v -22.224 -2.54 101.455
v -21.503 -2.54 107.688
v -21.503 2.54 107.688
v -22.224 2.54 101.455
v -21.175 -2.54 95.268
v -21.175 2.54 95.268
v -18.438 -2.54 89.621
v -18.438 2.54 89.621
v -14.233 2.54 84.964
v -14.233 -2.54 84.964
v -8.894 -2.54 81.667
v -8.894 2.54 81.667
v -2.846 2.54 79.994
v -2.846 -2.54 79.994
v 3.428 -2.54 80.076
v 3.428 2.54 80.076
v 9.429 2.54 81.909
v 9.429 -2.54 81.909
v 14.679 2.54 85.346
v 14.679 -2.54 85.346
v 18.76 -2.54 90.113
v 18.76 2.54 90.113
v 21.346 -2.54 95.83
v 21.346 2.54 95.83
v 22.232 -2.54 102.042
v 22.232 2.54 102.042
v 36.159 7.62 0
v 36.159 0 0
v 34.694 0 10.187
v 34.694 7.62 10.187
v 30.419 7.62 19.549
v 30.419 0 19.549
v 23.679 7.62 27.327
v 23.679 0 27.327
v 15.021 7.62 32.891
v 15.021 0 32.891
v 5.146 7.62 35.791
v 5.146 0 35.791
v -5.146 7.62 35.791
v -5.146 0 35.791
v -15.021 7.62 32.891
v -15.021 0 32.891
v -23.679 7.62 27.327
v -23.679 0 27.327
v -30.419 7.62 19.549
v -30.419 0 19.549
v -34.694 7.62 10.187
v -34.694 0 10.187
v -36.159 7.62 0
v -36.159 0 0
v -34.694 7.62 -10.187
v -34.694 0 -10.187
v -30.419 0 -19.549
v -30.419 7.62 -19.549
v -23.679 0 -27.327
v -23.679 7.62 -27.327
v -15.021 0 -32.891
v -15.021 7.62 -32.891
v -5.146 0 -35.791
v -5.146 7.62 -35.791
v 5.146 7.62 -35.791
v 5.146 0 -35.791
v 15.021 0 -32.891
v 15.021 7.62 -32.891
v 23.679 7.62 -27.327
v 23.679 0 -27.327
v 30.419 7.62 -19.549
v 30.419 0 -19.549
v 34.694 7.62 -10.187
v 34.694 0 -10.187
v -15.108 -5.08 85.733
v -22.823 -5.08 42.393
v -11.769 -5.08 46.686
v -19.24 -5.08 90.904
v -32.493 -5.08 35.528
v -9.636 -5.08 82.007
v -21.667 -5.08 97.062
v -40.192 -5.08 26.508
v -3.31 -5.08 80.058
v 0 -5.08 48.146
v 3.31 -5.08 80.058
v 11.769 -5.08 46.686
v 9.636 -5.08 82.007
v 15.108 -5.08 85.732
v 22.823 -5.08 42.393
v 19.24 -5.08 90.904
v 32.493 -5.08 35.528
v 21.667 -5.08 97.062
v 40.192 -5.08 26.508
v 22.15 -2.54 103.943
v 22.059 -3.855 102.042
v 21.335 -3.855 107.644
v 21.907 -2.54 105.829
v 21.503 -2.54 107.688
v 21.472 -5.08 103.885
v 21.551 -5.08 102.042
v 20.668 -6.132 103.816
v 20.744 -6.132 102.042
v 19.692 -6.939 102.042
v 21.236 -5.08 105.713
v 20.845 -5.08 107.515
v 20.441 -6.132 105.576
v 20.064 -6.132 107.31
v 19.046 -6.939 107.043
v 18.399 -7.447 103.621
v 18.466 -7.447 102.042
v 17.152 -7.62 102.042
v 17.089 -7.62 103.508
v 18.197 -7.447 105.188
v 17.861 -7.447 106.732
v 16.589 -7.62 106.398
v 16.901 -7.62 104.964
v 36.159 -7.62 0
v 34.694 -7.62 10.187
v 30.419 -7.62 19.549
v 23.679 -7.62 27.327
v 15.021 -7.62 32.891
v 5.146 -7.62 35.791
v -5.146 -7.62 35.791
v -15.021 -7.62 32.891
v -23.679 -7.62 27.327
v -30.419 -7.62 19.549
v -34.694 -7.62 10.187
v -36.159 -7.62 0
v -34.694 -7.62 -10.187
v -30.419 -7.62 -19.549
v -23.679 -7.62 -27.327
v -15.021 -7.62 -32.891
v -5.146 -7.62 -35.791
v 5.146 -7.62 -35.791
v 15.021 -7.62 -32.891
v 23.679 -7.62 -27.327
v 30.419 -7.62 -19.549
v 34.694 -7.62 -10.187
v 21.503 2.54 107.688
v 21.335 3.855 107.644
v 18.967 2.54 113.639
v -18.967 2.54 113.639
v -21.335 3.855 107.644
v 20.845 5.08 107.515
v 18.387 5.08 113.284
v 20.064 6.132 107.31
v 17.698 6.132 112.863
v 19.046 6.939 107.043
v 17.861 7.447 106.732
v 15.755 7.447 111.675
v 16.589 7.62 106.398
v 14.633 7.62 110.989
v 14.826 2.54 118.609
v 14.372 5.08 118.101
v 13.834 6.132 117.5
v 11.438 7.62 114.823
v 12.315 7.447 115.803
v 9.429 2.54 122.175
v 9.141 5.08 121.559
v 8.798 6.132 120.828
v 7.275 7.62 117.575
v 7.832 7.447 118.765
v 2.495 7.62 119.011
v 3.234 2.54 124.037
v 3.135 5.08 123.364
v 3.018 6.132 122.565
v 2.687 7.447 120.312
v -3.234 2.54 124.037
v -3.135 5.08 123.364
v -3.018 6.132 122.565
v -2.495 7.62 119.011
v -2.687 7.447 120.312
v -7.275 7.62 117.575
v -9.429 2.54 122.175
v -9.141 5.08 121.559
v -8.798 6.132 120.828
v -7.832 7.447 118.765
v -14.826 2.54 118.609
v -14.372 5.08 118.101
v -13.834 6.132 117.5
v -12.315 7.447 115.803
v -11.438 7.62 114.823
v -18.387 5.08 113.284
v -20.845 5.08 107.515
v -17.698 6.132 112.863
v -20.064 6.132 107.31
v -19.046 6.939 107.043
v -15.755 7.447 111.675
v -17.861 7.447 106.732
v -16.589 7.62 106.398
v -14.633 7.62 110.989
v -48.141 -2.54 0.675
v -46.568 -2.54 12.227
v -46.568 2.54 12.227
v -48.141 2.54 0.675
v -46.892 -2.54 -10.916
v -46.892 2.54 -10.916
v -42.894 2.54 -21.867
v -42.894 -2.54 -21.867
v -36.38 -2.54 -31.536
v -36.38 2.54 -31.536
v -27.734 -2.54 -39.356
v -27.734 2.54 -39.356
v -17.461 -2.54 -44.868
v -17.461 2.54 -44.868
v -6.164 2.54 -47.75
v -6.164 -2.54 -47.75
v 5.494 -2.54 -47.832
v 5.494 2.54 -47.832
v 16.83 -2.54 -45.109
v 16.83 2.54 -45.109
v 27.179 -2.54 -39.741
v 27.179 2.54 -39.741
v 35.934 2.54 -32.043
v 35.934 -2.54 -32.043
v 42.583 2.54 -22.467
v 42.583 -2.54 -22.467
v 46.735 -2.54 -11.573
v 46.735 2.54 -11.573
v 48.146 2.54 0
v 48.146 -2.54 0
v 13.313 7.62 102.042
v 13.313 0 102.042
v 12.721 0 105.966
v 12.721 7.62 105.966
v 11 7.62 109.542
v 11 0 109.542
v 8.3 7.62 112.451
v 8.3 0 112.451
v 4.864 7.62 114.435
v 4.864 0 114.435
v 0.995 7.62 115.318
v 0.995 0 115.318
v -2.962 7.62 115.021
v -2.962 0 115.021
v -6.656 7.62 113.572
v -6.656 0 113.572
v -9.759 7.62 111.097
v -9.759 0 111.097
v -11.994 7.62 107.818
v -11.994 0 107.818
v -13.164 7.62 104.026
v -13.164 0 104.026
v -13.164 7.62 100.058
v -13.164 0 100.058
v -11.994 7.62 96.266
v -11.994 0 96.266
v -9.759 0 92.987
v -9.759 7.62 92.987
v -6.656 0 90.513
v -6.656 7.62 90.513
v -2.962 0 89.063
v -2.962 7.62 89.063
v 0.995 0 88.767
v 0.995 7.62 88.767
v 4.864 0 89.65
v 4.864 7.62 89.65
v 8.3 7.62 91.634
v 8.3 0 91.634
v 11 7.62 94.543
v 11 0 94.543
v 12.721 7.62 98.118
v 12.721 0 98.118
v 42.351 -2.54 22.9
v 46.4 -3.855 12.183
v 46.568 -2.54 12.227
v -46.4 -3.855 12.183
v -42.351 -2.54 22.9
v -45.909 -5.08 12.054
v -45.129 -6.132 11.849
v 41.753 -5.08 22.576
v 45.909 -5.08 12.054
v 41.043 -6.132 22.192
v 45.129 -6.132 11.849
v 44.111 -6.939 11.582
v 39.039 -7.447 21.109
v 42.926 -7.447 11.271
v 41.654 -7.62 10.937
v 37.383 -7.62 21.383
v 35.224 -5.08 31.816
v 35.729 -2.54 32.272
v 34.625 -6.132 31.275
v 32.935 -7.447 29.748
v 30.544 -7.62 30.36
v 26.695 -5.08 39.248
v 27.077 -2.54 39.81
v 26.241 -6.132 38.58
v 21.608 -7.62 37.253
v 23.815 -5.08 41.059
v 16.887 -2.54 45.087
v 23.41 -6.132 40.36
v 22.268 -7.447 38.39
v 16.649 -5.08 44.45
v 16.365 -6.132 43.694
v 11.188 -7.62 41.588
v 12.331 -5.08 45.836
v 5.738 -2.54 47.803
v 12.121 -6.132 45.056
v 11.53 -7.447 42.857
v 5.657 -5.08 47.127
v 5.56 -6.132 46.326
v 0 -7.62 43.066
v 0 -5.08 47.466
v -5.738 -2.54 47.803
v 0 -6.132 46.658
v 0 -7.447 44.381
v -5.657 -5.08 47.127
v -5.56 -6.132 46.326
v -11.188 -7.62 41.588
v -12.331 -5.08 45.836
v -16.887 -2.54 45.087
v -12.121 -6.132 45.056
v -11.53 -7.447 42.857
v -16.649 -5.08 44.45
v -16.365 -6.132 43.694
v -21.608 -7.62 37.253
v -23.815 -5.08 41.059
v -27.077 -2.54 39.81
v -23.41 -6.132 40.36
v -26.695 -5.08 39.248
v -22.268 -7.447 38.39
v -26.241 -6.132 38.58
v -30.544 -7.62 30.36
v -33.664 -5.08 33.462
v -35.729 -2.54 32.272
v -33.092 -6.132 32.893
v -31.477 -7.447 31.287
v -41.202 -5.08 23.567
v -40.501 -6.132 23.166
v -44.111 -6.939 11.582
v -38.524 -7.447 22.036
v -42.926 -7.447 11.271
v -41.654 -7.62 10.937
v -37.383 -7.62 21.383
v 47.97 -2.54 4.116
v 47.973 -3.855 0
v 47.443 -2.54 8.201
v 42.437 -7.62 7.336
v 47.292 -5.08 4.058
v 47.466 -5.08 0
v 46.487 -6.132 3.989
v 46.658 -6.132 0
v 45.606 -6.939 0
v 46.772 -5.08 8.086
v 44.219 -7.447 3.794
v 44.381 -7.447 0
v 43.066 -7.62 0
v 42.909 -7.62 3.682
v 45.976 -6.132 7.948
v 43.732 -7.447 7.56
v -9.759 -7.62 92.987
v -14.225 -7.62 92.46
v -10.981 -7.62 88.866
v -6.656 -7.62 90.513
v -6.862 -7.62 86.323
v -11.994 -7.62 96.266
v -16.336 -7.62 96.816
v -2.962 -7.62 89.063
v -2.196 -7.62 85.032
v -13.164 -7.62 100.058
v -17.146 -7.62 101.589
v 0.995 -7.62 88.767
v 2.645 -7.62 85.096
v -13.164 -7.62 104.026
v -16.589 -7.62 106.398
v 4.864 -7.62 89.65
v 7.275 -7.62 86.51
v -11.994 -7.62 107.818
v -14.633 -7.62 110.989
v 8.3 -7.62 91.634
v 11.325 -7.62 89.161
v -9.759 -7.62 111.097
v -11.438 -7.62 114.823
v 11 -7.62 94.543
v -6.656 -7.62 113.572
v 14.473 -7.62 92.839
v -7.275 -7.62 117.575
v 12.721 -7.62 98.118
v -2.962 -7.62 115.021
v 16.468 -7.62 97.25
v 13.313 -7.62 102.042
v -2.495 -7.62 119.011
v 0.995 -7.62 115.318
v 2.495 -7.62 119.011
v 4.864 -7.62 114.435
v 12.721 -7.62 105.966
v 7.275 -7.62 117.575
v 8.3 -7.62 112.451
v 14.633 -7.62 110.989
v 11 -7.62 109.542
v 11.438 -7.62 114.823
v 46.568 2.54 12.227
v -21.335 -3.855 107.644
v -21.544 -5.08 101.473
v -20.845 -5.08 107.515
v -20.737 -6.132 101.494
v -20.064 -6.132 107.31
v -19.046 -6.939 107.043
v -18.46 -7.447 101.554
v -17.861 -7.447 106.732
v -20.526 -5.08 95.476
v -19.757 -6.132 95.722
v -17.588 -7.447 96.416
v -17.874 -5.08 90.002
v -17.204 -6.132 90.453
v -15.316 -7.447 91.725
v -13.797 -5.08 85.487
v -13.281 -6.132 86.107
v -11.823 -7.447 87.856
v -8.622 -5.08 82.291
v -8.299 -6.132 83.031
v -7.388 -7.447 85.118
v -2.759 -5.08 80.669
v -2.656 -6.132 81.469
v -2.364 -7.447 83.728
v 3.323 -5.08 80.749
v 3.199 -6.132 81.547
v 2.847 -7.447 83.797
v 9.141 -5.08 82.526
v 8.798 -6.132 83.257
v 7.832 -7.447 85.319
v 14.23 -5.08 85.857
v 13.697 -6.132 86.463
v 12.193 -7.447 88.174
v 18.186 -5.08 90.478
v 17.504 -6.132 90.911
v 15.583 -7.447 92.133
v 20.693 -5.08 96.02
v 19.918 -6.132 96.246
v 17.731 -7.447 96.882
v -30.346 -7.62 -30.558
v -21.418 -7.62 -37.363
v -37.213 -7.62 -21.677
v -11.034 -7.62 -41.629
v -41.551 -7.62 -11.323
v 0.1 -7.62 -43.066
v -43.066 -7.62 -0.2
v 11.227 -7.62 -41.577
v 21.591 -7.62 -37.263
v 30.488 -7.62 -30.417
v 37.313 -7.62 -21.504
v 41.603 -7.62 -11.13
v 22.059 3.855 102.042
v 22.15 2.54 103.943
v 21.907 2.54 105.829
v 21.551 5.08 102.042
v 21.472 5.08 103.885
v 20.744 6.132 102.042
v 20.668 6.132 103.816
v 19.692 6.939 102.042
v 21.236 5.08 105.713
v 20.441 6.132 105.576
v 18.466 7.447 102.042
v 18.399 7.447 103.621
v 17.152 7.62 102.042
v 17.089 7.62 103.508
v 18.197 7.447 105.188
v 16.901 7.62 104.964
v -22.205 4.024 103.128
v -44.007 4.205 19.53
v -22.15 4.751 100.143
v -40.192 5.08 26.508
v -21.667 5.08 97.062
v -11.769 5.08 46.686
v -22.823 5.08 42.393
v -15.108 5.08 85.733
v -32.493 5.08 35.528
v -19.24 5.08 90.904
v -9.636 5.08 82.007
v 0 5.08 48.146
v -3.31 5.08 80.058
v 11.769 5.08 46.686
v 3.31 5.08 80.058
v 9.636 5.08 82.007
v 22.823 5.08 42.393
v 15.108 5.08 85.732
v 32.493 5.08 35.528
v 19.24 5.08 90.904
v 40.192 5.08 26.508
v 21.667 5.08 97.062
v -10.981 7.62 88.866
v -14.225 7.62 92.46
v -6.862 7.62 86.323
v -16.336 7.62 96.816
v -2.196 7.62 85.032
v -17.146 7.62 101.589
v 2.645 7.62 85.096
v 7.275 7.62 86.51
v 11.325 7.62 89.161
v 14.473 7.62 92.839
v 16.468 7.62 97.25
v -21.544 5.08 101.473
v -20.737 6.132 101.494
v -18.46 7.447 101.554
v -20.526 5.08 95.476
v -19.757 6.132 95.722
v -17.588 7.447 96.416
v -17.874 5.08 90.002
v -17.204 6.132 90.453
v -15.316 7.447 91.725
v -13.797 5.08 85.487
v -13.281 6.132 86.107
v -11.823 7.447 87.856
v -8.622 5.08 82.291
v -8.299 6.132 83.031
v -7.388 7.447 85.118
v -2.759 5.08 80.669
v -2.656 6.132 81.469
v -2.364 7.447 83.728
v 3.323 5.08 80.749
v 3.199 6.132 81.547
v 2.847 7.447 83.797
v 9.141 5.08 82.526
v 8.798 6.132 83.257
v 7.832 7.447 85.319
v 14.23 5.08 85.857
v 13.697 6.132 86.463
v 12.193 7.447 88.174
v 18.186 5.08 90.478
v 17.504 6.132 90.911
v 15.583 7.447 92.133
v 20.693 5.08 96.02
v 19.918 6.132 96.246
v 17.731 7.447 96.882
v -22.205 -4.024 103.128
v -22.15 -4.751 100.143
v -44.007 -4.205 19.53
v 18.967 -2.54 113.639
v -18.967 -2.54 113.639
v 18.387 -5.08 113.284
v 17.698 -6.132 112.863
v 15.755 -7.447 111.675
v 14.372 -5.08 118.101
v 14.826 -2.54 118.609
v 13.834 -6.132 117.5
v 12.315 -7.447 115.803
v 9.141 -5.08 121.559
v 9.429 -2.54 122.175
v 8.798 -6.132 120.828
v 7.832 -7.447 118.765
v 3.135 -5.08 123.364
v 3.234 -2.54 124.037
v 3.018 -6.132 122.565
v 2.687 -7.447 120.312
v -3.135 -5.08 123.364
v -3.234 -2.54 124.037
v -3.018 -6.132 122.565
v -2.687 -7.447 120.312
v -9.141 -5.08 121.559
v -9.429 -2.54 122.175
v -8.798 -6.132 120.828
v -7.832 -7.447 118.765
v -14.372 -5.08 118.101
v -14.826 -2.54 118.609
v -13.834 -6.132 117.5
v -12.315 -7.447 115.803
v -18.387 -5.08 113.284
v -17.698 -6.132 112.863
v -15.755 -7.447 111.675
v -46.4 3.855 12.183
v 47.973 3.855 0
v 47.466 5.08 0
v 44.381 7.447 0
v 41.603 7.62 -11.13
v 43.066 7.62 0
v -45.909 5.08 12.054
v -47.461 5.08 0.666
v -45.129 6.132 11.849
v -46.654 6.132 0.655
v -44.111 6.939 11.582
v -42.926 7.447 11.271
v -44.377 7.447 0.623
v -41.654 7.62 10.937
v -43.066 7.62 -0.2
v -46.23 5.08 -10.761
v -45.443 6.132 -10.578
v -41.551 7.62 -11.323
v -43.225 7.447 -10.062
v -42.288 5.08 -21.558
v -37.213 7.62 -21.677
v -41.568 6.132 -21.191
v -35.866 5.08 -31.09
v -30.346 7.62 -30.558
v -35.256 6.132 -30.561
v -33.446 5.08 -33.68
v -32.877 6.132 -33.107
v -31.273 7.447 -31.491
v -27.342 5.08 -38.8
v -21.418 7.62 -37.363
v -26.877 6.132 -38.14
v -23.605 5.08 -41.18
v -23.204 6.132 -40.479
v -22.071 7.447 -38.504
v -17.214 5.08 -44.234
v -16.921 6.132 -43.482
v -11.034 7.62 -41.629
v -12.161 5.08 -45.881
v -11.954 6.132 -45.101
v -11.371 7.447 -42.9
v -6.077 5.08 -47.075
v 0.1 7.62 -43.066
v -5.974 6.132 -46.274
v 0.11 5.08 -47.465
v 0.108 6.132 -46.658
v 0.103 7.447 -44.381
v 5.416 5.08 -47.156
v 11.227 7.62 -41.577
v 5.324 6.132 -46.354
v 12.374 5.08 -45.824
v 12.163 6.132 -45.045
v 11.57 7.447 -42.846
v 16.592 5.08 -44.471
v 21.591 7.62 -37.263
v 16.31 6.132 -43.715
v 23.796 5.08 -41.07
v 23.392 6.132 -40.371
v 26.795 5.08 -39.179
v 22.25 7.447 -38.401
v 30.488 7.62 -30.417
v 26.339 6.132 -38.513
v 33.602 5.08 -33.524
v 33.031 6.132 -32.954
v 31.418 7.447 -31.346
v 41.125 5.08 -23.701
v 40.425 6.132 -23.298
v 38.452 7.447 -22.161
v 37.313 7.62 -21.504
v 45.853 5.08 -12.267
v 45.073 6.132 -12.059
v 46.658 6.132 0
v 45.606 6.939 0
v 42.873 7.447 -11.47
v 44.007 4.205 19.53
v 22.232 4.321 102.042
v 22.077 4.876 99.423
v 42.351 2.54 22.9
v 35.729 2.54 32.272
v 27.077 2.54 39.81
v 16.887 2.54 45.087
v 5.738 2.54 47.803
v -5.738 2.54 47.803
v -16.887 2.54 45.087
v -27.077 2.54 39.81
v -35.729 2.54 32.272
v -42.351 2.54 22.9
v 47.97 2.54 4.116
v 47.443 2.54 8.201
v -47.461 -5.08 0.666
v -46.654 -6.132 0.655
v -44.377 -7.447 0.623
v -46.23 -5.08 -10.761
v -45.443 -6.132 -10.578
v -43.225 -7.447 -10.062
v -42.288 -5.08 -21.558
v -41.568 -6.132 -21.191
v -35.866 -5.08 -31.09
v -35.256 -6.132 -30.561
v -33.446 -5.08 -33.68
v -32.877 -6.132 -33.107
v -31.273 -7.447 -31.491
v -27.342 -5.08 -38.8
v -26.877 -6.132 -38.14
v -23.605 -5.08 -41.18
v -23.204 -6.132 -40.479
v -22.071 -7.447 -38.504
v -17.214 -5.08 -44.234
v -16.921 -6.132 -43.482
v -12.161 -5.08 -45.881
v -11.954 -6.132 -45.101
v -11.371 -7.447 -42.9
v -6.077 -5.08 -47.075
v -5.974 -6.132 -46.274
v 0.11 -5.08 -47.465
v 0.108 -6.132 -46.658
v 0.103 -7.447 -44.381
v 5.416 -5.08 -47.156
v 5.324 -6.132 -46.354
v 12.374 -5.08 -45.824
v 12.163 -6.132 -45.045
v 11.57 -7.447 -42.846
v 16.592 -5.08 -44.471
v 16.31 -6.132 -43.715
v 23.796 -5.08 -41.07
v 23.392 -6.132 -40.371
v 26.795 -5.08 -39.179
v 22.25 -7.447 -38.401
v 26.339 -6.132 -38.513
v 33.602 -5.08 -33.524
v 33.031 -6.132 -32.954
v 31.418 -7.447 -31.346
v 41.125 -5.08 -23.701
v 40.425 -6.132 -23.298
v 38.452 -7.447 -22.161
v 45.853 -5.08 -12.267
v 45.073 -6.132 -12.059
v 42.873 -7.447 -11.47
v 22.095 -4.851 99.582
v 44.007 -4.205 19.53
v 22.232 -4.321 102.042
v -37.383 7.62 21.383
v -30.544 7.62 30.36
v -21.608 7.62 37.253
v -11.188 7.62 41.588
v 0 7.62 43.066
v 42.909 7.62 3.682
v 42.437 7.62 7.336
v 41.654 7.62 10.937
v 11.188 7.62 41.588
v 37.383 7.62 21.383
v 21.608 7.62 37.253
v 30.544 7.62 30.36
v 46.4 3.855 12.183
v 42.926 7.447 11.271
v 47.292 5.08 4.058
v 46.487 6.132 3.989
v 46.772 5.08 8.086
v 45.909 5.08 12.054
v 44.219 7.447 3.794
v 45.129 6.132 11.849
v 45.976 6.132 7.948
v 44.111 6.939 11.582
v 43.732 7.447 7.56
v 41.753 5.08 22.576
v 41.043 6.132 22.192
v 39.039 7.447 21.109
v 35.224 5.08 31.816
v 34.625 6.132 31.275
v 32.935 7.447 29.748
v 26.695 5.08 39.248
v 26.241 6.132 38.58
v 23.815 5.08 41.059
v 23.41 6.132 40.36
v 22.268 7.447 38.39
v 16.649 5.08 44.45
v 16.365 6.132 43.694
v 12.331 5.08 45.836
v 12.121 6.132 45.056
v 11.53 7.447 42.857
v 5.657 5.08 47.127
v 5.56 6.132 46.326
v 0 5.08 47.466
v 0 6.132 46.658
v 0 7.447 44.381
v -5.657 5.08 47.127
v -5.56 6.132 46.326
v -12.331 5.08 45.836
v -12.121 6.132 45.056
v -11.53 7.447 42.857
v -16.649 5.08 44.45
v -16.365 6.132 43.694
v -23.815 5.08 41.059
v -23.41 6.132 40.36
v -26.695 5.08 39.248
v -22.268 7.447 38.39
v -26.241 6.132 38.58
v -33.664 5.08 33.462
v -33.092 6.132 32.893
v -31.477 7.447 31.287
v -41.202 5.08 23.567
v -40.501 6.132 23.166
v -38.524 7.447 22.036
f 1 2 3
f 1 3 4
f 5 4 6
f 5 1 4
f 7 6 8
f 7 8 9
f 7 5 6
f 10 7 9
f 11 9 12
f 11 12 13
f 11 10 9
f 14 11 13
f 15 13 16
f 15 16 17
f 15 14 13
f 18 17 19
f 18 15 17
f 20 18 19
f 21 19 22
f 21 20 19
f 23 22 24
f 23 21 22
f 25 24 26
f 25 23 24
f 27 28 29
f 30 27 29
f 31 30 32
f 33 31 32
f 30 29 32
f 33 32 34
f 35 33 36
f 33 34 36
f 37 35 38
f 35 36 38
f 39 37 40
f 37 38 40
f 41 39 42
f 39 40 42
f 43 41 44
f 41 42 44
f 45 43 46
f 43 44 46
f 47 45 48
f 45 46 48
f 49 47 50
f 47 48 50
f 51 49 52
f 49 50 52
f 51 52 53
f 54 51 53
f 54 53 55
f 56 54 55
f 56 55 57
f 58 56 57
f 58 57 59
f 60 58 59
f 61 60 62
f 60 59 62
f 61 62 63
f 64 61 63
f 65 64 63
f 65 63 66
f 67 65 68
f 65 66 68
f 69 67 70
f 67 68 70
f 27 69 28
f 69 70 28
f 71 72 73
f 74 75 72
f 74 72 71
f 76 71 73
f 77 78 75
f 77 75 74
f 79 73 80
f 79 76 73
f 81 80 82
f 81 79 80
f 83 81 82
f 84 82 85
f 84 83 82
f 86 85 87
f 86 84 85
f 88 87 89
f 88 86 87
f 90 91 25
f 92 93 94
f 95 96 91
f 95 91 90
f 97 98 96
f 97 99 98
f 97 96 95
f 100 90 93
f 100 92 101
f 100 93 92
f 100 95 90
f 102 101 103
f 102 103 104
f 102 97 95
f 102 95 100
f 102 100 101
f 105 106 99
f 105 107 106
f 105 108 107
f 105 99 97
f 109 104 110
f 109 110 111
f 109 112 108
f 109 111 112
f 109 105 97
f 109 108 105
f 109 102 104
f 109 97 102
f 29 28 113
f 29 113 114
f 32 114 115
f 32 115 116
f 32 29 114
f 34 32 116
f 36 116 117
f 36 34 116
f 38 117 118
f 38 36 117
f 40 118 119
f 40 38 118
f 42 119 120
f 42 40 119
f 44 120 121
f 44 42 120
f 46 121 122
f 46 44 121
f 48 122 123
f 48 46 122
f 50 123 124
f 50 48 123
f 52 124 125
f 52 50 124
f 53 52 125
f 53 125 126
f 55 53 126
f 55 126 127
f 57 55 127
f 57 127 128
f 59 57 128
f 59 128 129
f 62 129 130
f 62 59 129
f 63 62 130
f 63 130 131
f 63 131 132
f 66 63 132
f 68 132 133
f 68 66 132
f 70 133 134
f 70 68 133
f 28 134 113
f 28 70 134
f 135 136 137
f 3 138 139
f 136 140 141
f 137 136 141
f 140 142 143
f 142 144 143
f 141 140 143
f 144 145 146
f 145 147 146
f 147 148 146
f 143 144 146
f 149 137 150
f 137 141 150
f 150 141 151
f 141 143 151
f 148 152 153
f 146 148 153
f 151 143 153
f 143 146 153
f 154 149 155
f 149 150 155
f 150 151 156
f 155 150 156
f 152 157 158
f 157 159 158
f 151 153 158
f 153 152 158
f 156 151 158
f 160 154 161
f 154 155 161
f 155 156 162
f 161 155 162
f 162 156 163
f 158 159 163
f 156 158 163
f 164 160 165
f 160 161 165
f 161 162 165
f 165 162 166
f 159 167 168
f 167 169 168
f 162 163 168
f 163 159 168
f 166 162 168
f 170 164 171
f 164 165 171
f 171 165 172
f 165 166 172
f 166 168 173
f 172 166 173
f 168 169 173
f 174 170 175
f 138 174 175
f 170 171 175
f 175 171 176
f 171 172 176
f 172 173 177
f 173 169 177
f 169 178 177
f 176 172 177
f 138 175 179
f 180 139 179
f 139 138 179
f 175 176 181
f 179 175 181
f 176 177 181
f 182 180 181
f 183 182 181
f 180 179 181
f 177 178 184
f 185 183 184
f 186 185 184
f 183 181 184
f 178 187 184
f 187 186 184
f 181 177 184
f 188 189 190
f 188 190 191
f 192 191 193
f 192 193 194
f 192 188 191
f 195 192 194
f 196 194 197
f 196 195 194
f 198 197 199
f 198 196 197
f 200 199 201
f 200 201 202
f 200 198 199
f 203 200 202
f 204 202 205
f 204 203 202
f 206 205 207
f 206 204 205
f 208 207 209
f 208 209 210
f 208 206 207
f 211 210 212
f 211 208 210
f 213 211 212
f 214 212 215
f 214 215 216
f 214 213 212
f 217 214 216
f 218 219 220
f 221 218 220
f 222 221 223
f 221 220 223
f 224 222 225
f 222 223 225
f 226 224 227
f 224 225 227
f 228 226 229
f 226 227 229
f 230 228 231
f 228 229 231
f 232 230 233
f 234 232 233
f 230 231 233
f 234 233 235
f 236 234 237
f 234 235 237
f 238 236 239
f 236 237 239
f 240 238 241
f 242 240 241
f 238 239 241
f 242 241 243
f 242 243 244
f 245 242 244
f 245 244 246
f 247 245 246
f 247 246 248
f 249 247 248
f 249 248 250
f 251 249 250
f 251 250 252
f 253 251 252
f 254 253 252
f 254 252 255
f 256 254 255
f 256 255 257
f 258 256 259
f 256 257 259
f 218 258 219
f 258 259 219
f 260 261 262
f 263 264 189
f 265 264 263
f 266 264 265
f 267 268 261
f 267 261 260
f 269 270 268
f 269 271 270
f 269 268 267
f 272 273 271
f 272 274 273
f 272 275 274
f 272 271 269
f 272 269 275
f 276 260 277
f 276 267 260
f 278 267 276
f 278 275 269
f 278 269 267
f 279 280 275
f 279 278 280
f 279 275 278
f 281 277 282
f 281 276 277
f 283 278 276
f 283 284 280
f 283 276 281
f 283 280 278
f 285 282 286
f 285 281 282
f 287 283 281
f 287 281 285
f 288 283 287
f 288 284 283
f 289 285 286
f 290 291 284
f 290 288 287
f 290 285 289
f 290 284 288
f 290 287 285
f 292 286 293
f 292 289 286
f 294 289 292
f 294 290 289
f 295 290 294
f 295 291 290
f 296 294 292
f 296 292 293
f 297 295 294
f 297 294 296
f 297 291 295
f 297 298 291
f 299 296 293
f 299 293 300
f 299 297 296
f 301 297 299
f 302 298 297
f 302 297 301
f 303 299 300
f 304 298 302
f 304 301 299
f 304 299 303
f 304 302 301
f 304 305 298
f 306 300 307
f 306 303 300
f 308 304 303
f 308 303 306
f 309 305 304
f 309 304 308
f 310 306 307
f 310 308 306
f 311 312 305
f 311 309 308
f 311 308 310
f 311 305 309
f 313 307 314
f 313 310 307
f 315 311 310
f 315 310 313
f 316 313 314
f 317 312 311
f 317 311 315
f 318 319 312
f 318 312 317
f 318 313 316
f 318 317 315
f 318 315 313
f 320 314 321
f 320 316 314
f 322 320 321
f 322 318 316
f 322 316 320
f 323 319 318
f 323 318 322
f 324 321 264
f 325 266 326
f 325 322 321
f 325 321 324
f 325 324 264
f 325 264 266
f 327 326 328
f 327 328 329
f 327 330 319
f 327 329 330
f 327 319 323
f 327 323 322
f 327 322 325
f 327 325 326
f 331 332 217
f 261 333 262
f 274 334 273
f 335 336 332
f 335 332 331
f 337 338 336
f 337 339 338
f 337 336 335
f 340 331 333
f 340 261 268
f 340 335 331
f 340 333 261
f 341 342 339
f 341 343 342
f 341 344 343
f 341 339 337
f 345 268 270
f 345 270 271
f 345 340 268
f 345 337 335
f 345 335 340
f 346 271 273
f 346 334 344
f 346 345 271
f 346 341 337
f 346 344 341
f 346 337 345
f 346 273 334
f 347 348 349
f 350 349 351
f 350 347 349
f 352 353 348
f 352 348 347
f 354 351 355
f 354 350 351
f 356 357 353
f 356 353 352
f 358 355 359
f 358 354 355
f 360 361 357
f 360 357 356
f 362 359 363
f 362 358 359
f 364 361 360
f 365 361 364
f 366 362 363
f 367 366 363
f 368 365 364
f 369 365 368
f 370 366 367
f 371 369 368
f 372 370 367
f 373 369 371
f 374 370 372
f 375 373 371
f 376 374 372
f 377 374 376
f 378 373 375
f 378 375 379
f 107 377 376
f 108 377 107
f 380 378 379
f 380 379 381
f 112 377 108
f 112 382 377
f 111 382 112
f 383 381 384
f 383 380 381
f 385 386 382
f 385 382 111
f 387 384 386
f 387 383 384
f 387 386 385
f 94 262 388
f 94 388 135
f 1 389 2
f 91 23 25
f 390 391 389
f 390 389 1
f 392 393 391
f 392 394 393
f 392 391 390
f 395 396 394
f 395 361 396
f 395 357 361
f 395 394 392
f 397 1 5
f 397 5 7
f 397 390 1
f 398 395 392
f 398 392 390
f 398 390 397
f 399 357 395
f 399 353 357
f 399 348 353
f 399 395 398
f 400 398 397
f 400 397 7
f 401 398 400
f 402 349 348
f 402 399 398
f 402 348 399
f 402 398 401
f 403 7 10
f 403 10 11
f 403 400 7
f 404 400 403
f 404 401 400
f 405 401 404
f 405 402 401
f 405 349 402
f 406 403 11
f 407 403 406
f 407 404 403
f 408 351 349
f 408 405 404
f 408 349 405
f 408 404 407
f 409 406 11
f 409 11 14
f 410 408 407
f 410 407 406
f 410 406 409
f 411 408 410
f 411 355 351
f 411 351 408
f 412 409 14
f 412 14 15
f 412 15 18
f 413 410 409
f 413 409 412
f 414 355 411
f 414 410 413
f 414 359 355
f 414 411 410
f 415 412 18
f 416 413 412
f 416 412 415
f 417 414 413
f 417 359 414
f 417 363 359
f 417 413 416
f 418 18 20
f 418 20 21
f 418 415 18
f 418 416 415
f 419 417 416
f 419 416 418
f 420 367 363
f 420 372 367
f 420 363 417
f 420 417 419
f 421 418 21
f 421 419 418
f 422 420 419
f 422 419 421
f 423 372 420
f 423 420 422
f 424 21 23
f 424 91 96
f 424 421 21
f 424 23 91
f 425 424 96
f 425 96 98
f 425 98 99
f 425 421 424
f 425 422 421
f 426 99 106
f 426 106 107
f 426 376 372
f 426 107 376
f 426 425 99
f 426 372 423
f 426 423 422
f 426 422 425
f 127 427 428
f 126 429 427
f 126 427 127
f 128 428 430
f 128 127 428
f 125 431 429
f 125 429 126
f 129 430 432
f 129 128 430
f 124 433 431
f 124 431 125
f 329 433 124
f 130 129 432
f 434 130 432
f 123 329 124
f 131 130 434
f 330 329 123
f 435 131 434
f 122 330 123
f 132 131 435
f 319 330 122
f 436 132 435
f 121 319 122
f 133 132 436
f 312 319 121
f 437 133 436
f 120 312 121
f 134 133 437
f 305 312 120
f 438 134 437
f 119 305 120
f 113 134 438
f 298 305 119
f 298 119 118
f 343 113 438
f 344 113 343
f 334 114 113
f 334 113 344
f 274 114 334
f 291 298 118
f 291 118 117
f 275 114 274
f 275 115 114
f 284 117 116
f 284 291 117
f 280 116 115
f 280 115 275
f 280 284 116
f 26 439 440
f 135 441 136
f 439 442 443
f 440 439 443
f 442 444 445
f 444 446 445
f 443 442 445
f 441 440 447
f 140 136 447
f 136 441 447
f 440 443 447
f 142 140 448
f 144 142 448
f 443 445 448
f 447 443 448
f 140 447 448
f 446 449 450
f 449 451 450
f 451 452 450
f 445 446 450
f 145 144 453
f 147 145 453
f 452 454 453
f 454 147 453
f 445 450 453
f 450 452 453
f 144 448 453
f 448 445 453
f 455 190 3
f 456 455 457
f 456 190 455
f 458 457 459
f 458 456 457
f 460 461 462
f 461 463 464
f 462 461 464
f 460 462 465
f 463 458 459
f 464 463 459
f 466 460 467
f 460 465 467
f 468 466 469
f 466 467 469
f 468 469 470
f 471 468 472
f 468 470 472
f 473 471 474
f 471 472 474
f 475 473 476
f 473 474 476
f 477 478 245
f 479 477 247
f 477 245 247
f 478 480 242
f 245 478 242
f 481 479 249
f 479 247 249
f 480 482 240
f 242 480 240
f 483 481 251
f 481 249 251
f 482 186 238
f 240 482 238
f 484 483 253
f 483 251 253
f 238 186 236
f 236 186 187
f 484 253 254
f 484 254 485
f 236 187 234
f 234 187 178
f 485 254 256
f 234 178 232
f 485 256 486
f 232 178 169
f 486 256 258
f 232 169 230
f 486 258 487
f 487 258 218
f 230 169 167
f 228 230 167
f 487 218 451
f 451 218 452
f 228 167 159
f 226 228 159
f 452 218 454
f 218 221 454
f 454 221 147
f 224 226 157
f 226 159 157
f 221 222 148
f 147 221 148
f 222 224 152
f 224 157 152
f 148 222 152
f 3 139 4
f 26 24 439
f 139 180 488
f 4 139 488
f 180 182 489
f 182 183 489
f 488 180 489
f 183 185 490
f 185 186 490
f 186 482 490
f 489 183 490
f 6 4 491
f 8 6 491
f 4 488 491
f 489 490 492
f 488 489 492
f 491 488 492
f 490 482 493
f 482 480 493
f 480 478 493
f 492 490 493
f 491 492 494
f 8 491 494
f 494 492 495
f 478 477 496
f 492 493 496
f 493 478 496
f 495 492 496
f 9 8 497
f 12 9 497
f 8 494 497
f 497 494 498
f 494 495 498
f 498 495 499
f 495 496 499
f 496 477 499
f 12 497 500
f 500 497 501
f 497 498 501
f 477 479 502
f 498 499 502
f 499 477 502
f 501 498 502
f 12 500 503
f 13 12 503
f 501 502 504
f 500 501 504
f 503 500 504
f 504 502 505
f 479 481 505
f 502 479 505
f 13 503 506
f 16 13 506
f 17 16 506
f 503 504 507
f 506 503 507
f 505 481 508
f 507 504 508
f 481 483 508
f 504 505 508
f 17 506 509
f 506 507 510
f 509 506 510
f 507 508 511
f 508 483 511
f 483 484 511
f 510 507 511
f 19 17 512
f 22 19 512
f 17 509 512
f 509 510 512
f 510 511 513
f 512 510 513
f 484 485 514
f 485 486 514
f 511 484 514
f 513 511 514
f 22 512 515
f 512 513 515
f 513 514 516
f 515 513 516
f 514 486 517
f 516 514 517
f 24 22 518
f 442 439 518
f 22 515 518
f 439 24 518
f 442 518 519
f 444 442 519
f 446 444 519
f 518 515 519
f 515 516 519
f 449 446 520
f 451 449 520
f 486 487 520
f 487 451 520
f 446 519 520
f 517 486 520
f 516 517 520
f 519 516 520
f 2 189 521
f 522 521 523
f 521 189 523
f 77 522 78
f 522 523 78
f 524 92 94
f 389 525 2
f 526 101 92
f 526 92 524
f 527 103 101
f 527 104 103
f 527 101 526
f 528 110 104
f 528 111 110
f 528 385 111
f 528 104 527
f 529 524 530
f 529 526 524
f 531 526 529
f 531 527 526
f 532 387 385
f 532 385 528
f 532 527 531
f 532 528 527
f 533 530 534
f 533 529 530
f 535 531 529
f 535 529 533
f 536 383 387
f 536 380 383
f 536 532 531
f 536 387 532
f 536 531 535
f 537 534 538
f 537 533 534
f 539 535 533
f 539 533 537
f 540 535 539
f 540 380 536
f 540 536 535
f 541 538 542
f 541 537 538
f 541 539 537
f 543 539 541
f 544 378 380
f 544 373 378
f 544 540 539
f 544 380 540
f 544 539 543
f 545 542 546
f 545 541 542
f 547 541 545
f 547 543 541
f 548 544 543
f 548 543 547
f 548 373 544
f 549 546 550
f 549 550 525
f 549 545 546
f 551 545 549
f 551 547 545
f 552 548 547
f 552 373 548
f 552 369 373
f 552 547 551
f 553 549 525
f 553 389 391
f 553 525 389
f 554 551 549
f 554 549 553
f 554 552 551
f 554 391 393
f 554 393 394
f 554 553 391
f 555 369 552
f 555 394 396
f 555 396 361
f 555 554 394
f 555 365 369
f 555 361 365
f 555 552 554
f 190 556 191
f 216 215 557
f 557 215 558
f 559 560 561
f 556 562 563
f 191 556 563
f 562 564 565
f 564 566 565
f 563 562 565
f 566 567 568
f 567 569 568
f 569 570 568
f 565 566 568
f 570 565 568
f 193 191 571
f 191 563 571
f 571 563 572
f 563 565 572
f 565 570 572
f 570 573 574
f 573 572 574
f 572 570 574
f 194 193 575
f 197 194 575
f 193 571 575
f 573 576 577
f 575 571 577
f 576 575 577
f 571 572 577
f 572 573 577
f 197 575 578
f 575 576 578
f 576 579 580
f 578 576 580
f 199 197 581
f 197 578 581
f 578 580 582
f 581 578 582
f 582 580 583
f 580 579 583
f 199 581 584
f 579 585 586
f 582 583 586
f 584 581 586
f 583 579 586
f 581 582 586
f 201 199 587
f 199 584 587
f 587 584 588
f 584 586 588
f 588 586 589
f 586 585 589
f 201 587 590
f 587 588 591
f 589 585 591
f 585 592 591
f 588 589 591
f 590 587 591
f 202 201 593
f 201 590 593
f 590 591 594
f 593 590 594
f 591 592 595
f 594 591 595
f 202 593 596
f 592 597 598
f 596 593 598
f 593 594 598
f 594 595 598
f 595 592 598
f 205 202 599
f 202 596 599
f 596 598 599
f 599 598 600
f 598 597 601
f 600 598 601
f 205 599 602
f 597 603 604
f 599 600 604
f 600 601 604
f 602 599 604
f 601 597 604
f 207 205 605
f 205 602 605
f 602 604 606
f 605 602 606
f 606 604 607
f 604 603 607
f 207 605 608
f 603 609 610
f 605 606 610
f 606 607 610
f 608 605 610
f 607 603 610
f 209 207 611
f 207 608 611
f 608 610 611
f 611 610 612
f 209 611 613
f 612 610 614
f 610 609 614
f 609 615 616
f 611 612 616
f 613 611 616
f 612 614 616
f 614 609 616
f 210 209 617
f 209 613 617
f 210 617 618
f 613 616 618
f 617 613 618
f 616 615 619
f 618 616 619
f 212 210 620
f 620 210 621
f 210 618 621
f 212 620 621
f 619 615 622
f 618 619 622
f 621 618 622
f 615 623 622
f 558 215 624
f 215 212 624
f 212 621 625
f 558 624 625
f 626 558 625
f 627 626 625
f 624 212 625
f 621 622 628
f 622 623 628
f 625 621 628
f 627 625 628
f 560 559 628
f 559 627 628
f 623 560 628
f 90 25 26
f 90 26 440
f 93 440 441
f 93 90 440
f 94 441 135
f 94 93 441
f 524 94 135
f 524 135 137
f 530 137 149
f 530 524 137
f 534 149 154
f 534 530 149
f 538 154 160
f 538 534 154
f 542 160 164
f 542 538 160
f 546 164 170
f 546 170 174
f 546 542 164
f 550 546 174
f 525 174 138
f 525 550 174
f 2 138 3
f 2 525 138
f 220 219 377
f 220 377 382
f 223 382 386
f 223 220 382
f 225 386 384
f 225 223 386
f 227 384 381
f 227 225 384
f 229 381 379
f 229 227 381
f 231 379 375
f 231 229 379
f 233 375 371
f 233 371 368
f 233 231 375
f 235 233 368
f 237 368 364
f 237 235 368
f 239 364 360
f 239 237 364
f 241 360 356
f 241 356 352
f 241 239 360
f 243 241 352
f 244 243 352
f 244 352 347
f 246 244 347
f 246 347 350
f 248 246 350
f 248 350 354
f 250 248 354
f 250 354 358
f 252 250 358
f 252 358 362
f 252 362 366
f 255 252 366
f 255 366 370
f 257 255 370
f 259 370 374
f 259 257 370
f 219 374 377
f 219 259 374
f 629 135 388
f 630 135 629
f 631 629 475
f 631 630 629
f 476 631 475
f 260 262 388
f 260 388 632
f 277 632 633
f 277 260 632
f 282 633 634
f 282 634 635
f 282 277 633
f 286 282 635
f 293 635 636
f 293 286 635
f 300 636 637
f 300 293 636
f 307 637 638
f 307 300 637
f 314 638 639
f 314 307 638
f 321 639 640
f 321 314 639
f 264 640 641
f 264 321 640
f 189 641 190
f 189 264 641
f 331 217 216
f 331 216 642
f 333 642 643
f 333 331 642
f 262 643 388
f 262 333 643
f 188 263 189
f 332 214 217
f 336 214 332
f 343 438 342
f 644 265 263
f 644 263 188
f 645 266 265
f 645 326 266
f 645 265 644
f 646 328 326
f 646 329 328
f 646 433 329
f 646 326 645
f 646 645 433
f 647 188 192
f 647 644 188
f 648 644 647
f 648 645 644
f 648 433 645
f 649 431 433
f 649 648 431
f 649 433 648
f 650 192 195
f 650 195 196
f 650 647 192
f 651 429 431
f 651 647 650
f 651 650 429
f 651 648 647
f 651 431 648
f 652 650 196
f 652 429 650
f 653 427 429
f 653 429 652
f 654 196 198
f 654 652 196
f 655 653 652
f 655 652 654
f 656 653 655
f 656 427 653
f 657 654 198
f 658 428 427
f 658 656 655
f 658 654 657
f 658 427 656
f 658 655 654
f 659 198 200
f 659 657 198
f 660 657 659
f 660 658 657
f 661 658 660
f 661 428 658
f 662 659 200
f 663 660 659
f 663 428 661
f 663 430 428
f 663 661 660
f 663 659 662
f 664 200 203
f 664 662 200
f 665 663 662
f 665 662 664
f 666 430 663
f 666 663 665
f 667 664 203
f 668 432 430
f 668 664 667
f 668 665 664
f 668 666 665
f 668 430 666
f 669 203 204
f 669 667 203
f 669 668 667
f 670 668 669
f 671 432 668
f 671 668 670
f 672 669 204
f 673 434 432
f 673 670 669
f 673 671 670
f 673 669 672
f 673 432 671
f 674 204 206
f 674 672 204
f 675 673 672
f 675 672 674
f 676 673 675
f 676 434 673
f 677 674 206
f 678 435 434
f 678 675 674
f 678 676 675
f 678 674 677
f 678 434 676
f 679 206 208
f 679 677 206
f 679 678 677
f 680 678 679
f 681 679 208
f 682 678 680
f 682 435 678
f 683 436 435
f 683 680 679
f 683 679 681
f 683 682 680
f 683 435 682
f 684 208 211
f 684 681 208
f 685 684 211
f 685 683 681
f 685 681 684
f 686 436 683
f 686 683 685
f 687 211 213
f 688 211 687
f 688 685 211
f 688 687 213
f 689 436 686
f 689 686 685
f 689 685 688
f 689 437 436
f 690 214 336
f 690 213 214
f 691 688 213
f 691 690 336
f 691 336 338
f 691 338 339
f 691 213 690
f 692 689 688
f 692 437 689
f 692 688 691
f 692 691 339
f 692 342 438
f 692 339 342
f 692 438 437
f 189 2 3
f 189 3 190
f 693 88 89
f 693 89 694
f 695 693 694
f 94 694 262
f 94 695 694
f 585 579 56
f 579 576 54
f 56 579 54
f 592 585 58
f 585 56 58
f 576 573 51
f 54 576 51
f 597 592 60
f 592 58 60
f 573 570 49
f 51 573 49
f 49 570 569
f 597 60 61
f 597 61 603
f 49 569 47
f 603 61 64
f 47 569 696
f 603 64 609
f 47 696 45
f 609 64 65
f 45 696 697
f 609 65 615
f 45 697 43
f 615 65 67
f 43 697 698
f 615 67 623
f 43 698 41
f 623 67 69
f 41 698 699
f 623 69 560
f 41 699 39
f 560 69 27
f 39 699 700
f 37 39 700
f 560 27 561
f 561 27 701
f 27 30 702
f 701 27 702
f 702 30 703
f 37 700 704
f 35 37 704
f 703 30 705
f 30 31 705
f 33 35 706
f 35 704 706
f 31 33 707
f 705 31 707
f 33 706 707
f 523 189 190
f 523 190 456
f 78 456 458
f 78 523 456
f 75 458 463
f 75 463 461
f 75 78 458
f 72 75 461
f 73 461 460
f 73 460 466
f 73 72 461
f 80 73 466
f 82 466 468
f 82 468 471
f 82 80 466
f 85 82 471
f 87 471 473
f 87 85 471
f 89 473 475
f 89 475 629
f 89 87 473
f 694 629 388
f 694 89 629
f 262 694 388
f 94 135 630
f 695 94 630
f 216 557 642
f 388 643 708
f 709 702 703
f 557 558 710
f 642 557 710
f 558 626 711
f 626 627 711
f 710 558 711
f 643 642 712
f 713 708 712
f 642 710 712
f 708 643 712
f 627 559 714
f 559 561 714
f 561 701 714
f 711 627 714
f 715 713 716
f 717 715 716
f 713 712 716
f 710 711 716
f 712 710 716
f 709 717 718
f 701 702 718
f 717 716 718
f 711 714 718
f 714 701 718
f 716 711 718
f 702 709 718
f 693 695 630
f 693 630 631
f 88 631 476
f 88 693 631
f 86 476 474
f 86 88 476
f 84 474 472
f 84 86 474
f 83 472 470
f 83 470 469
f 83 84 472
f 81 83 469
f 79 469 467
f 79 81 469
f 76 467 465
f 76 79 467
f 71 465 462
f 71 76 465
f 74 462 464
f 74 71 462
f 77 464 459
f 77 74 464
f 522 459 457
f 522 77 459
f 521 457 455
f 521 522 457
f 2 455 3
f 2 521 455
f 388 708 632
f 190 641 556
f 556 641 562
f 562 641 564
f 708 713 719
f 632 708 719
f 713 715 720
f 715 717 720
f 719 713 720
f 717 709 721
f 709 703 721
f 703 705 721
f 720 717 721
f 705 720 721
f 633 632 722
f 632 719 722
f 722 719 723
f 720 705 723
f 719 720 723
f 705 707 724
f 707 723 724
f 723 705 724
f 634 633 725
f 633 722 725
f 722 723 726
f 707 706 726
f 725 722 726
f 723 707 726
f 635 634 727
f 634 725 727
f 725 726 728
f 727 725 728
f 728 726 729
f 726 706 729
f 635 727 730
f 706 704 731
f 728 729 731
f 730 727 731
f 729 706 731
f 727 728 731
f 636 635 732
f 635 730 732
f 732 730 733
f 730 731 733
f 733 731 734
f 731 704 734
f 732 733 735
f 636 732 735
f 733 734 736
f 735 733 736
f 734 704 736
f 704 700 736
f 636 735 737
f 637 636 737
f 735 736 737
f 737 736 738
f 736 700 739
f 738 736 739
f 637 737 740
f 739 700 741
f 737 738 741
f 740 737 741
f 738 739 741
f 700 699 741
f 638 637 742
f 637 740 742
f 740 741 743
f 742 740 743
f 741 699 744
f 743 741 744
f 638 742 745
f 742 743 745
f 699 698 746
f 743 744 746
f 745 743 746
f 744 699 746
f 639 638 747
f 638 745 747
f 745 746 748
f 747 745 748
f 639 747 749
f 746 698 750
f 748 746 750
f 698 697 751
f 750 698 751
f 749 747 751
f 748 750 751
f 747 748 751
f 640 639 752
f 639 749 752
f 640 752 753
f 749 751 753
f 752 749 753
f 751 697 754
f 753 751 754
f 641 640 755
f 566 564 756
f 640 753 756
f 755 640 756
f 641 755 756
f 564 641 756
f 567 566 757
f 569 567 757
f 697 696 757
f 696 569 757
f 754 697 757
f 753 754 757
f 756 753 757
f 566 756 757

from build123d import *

# Parameters (mm, degrees)
F0_R          = 36.158901
F0_R_2        = 13.312834
F1_DEPTH      = 7.62
F1_DEPTH_BACK = 7.62
F2_DEPTH      = 5.08
F2_DEPTH_BACK = 5.08
F3_R          = 5.08
F4_R          = 2.54


with BuildPart() as f1:
    # F0 (on Front) → F1 (new body, two sides)
    with BuildSketch(Plane.XZ) as f1_sk:
        with BuildLine():
            ThreePointArc((-46.567724, 12.227131), (-6.164298, -47.749944), (48.146191, 0))
            ThreePointArc((48.146191, 0), (47.749944, 6.164298), (46.567724, 12.227131))
            ThreePointArc((46.567724, 12.227131), (0, 48.146191), (-46.567724, 12.227131))
        make_face()
        Circle(F0_R, mode=Mode.SUBTRACT)
        with BuildLine():
            ThreePointArc((22.231698, 102.042265), (22.048729, 104.888655), (21.502834, 107.688192))
            ThreePointArc((21.502834, 107.688192), (0, 124.273963), (-21.502834, 107.688192))
            ThreePointArc((-21.502834, 107.688192), (-2.846389, 79.993536), (22.231698, 102.042265))
        make_face()
        with Locations((0, 102.042265)):
            Circle(F0_R_2, mode=Mode.SUBTRACT)
    extrude(amount=F1_DEPTH)
    extrude(f1_sk.sketch, amount=-F1_DEPTH_BACK)

    # F3
    f3_edges = [f1.edges().sort_by_distance(p)[0] for p in [
        (-22.231698, -7.62, 102.042265),
        (-48.146191, -7.62, 0),
        (-48.146191, 7.62, 0),
        (-22.231698, 7.62, 102.042265),
    ]]
    fillet(f3_edges, radius=F3_R)


with BuildPart() as f2:
    # F0 (on Front) → F2 (new body, two sides)
    with BuildSketch(Plane.XZ) as f2_sk:
        with BuildLine():
            ThreePointArc((-46.567724, 12.227131), (0, 48.146191), (46.567724, 12.227131))
            Line((46.567724, 12.227131), (21.502834, 107.688192))
            ThreePointArc((21.502834, 107.688192), (22.048729, 104.888655), (22.231698, 102.042265))
            ThreePointArc((22.231698, 102.042265), (-2.846389, 79.993536), (-21.502834, 107.688192))
            Line((-21.502834, 107.688192), (-46.567724, 12.227131))
        make_face()
    extrude(amount=F2_DEPTH)
    extrude(f2_sk.sketch, amount=-F2_DEPTH_BACK)

    # F4
    f4_edges = [f2.edges().sort_by_distance(p)[0] for p in [
        (34.035279, 5.08, 59.957662),
        (34.035279, -5.08, 59.957662),
        (-34.035279, 5.08, 59.957662),
        (-34.035279, -5.08, 59.957662),
    ]]
    fillet(f4_edges, radius=F4_R)


solid = Compound([f1.part, f2.part])
